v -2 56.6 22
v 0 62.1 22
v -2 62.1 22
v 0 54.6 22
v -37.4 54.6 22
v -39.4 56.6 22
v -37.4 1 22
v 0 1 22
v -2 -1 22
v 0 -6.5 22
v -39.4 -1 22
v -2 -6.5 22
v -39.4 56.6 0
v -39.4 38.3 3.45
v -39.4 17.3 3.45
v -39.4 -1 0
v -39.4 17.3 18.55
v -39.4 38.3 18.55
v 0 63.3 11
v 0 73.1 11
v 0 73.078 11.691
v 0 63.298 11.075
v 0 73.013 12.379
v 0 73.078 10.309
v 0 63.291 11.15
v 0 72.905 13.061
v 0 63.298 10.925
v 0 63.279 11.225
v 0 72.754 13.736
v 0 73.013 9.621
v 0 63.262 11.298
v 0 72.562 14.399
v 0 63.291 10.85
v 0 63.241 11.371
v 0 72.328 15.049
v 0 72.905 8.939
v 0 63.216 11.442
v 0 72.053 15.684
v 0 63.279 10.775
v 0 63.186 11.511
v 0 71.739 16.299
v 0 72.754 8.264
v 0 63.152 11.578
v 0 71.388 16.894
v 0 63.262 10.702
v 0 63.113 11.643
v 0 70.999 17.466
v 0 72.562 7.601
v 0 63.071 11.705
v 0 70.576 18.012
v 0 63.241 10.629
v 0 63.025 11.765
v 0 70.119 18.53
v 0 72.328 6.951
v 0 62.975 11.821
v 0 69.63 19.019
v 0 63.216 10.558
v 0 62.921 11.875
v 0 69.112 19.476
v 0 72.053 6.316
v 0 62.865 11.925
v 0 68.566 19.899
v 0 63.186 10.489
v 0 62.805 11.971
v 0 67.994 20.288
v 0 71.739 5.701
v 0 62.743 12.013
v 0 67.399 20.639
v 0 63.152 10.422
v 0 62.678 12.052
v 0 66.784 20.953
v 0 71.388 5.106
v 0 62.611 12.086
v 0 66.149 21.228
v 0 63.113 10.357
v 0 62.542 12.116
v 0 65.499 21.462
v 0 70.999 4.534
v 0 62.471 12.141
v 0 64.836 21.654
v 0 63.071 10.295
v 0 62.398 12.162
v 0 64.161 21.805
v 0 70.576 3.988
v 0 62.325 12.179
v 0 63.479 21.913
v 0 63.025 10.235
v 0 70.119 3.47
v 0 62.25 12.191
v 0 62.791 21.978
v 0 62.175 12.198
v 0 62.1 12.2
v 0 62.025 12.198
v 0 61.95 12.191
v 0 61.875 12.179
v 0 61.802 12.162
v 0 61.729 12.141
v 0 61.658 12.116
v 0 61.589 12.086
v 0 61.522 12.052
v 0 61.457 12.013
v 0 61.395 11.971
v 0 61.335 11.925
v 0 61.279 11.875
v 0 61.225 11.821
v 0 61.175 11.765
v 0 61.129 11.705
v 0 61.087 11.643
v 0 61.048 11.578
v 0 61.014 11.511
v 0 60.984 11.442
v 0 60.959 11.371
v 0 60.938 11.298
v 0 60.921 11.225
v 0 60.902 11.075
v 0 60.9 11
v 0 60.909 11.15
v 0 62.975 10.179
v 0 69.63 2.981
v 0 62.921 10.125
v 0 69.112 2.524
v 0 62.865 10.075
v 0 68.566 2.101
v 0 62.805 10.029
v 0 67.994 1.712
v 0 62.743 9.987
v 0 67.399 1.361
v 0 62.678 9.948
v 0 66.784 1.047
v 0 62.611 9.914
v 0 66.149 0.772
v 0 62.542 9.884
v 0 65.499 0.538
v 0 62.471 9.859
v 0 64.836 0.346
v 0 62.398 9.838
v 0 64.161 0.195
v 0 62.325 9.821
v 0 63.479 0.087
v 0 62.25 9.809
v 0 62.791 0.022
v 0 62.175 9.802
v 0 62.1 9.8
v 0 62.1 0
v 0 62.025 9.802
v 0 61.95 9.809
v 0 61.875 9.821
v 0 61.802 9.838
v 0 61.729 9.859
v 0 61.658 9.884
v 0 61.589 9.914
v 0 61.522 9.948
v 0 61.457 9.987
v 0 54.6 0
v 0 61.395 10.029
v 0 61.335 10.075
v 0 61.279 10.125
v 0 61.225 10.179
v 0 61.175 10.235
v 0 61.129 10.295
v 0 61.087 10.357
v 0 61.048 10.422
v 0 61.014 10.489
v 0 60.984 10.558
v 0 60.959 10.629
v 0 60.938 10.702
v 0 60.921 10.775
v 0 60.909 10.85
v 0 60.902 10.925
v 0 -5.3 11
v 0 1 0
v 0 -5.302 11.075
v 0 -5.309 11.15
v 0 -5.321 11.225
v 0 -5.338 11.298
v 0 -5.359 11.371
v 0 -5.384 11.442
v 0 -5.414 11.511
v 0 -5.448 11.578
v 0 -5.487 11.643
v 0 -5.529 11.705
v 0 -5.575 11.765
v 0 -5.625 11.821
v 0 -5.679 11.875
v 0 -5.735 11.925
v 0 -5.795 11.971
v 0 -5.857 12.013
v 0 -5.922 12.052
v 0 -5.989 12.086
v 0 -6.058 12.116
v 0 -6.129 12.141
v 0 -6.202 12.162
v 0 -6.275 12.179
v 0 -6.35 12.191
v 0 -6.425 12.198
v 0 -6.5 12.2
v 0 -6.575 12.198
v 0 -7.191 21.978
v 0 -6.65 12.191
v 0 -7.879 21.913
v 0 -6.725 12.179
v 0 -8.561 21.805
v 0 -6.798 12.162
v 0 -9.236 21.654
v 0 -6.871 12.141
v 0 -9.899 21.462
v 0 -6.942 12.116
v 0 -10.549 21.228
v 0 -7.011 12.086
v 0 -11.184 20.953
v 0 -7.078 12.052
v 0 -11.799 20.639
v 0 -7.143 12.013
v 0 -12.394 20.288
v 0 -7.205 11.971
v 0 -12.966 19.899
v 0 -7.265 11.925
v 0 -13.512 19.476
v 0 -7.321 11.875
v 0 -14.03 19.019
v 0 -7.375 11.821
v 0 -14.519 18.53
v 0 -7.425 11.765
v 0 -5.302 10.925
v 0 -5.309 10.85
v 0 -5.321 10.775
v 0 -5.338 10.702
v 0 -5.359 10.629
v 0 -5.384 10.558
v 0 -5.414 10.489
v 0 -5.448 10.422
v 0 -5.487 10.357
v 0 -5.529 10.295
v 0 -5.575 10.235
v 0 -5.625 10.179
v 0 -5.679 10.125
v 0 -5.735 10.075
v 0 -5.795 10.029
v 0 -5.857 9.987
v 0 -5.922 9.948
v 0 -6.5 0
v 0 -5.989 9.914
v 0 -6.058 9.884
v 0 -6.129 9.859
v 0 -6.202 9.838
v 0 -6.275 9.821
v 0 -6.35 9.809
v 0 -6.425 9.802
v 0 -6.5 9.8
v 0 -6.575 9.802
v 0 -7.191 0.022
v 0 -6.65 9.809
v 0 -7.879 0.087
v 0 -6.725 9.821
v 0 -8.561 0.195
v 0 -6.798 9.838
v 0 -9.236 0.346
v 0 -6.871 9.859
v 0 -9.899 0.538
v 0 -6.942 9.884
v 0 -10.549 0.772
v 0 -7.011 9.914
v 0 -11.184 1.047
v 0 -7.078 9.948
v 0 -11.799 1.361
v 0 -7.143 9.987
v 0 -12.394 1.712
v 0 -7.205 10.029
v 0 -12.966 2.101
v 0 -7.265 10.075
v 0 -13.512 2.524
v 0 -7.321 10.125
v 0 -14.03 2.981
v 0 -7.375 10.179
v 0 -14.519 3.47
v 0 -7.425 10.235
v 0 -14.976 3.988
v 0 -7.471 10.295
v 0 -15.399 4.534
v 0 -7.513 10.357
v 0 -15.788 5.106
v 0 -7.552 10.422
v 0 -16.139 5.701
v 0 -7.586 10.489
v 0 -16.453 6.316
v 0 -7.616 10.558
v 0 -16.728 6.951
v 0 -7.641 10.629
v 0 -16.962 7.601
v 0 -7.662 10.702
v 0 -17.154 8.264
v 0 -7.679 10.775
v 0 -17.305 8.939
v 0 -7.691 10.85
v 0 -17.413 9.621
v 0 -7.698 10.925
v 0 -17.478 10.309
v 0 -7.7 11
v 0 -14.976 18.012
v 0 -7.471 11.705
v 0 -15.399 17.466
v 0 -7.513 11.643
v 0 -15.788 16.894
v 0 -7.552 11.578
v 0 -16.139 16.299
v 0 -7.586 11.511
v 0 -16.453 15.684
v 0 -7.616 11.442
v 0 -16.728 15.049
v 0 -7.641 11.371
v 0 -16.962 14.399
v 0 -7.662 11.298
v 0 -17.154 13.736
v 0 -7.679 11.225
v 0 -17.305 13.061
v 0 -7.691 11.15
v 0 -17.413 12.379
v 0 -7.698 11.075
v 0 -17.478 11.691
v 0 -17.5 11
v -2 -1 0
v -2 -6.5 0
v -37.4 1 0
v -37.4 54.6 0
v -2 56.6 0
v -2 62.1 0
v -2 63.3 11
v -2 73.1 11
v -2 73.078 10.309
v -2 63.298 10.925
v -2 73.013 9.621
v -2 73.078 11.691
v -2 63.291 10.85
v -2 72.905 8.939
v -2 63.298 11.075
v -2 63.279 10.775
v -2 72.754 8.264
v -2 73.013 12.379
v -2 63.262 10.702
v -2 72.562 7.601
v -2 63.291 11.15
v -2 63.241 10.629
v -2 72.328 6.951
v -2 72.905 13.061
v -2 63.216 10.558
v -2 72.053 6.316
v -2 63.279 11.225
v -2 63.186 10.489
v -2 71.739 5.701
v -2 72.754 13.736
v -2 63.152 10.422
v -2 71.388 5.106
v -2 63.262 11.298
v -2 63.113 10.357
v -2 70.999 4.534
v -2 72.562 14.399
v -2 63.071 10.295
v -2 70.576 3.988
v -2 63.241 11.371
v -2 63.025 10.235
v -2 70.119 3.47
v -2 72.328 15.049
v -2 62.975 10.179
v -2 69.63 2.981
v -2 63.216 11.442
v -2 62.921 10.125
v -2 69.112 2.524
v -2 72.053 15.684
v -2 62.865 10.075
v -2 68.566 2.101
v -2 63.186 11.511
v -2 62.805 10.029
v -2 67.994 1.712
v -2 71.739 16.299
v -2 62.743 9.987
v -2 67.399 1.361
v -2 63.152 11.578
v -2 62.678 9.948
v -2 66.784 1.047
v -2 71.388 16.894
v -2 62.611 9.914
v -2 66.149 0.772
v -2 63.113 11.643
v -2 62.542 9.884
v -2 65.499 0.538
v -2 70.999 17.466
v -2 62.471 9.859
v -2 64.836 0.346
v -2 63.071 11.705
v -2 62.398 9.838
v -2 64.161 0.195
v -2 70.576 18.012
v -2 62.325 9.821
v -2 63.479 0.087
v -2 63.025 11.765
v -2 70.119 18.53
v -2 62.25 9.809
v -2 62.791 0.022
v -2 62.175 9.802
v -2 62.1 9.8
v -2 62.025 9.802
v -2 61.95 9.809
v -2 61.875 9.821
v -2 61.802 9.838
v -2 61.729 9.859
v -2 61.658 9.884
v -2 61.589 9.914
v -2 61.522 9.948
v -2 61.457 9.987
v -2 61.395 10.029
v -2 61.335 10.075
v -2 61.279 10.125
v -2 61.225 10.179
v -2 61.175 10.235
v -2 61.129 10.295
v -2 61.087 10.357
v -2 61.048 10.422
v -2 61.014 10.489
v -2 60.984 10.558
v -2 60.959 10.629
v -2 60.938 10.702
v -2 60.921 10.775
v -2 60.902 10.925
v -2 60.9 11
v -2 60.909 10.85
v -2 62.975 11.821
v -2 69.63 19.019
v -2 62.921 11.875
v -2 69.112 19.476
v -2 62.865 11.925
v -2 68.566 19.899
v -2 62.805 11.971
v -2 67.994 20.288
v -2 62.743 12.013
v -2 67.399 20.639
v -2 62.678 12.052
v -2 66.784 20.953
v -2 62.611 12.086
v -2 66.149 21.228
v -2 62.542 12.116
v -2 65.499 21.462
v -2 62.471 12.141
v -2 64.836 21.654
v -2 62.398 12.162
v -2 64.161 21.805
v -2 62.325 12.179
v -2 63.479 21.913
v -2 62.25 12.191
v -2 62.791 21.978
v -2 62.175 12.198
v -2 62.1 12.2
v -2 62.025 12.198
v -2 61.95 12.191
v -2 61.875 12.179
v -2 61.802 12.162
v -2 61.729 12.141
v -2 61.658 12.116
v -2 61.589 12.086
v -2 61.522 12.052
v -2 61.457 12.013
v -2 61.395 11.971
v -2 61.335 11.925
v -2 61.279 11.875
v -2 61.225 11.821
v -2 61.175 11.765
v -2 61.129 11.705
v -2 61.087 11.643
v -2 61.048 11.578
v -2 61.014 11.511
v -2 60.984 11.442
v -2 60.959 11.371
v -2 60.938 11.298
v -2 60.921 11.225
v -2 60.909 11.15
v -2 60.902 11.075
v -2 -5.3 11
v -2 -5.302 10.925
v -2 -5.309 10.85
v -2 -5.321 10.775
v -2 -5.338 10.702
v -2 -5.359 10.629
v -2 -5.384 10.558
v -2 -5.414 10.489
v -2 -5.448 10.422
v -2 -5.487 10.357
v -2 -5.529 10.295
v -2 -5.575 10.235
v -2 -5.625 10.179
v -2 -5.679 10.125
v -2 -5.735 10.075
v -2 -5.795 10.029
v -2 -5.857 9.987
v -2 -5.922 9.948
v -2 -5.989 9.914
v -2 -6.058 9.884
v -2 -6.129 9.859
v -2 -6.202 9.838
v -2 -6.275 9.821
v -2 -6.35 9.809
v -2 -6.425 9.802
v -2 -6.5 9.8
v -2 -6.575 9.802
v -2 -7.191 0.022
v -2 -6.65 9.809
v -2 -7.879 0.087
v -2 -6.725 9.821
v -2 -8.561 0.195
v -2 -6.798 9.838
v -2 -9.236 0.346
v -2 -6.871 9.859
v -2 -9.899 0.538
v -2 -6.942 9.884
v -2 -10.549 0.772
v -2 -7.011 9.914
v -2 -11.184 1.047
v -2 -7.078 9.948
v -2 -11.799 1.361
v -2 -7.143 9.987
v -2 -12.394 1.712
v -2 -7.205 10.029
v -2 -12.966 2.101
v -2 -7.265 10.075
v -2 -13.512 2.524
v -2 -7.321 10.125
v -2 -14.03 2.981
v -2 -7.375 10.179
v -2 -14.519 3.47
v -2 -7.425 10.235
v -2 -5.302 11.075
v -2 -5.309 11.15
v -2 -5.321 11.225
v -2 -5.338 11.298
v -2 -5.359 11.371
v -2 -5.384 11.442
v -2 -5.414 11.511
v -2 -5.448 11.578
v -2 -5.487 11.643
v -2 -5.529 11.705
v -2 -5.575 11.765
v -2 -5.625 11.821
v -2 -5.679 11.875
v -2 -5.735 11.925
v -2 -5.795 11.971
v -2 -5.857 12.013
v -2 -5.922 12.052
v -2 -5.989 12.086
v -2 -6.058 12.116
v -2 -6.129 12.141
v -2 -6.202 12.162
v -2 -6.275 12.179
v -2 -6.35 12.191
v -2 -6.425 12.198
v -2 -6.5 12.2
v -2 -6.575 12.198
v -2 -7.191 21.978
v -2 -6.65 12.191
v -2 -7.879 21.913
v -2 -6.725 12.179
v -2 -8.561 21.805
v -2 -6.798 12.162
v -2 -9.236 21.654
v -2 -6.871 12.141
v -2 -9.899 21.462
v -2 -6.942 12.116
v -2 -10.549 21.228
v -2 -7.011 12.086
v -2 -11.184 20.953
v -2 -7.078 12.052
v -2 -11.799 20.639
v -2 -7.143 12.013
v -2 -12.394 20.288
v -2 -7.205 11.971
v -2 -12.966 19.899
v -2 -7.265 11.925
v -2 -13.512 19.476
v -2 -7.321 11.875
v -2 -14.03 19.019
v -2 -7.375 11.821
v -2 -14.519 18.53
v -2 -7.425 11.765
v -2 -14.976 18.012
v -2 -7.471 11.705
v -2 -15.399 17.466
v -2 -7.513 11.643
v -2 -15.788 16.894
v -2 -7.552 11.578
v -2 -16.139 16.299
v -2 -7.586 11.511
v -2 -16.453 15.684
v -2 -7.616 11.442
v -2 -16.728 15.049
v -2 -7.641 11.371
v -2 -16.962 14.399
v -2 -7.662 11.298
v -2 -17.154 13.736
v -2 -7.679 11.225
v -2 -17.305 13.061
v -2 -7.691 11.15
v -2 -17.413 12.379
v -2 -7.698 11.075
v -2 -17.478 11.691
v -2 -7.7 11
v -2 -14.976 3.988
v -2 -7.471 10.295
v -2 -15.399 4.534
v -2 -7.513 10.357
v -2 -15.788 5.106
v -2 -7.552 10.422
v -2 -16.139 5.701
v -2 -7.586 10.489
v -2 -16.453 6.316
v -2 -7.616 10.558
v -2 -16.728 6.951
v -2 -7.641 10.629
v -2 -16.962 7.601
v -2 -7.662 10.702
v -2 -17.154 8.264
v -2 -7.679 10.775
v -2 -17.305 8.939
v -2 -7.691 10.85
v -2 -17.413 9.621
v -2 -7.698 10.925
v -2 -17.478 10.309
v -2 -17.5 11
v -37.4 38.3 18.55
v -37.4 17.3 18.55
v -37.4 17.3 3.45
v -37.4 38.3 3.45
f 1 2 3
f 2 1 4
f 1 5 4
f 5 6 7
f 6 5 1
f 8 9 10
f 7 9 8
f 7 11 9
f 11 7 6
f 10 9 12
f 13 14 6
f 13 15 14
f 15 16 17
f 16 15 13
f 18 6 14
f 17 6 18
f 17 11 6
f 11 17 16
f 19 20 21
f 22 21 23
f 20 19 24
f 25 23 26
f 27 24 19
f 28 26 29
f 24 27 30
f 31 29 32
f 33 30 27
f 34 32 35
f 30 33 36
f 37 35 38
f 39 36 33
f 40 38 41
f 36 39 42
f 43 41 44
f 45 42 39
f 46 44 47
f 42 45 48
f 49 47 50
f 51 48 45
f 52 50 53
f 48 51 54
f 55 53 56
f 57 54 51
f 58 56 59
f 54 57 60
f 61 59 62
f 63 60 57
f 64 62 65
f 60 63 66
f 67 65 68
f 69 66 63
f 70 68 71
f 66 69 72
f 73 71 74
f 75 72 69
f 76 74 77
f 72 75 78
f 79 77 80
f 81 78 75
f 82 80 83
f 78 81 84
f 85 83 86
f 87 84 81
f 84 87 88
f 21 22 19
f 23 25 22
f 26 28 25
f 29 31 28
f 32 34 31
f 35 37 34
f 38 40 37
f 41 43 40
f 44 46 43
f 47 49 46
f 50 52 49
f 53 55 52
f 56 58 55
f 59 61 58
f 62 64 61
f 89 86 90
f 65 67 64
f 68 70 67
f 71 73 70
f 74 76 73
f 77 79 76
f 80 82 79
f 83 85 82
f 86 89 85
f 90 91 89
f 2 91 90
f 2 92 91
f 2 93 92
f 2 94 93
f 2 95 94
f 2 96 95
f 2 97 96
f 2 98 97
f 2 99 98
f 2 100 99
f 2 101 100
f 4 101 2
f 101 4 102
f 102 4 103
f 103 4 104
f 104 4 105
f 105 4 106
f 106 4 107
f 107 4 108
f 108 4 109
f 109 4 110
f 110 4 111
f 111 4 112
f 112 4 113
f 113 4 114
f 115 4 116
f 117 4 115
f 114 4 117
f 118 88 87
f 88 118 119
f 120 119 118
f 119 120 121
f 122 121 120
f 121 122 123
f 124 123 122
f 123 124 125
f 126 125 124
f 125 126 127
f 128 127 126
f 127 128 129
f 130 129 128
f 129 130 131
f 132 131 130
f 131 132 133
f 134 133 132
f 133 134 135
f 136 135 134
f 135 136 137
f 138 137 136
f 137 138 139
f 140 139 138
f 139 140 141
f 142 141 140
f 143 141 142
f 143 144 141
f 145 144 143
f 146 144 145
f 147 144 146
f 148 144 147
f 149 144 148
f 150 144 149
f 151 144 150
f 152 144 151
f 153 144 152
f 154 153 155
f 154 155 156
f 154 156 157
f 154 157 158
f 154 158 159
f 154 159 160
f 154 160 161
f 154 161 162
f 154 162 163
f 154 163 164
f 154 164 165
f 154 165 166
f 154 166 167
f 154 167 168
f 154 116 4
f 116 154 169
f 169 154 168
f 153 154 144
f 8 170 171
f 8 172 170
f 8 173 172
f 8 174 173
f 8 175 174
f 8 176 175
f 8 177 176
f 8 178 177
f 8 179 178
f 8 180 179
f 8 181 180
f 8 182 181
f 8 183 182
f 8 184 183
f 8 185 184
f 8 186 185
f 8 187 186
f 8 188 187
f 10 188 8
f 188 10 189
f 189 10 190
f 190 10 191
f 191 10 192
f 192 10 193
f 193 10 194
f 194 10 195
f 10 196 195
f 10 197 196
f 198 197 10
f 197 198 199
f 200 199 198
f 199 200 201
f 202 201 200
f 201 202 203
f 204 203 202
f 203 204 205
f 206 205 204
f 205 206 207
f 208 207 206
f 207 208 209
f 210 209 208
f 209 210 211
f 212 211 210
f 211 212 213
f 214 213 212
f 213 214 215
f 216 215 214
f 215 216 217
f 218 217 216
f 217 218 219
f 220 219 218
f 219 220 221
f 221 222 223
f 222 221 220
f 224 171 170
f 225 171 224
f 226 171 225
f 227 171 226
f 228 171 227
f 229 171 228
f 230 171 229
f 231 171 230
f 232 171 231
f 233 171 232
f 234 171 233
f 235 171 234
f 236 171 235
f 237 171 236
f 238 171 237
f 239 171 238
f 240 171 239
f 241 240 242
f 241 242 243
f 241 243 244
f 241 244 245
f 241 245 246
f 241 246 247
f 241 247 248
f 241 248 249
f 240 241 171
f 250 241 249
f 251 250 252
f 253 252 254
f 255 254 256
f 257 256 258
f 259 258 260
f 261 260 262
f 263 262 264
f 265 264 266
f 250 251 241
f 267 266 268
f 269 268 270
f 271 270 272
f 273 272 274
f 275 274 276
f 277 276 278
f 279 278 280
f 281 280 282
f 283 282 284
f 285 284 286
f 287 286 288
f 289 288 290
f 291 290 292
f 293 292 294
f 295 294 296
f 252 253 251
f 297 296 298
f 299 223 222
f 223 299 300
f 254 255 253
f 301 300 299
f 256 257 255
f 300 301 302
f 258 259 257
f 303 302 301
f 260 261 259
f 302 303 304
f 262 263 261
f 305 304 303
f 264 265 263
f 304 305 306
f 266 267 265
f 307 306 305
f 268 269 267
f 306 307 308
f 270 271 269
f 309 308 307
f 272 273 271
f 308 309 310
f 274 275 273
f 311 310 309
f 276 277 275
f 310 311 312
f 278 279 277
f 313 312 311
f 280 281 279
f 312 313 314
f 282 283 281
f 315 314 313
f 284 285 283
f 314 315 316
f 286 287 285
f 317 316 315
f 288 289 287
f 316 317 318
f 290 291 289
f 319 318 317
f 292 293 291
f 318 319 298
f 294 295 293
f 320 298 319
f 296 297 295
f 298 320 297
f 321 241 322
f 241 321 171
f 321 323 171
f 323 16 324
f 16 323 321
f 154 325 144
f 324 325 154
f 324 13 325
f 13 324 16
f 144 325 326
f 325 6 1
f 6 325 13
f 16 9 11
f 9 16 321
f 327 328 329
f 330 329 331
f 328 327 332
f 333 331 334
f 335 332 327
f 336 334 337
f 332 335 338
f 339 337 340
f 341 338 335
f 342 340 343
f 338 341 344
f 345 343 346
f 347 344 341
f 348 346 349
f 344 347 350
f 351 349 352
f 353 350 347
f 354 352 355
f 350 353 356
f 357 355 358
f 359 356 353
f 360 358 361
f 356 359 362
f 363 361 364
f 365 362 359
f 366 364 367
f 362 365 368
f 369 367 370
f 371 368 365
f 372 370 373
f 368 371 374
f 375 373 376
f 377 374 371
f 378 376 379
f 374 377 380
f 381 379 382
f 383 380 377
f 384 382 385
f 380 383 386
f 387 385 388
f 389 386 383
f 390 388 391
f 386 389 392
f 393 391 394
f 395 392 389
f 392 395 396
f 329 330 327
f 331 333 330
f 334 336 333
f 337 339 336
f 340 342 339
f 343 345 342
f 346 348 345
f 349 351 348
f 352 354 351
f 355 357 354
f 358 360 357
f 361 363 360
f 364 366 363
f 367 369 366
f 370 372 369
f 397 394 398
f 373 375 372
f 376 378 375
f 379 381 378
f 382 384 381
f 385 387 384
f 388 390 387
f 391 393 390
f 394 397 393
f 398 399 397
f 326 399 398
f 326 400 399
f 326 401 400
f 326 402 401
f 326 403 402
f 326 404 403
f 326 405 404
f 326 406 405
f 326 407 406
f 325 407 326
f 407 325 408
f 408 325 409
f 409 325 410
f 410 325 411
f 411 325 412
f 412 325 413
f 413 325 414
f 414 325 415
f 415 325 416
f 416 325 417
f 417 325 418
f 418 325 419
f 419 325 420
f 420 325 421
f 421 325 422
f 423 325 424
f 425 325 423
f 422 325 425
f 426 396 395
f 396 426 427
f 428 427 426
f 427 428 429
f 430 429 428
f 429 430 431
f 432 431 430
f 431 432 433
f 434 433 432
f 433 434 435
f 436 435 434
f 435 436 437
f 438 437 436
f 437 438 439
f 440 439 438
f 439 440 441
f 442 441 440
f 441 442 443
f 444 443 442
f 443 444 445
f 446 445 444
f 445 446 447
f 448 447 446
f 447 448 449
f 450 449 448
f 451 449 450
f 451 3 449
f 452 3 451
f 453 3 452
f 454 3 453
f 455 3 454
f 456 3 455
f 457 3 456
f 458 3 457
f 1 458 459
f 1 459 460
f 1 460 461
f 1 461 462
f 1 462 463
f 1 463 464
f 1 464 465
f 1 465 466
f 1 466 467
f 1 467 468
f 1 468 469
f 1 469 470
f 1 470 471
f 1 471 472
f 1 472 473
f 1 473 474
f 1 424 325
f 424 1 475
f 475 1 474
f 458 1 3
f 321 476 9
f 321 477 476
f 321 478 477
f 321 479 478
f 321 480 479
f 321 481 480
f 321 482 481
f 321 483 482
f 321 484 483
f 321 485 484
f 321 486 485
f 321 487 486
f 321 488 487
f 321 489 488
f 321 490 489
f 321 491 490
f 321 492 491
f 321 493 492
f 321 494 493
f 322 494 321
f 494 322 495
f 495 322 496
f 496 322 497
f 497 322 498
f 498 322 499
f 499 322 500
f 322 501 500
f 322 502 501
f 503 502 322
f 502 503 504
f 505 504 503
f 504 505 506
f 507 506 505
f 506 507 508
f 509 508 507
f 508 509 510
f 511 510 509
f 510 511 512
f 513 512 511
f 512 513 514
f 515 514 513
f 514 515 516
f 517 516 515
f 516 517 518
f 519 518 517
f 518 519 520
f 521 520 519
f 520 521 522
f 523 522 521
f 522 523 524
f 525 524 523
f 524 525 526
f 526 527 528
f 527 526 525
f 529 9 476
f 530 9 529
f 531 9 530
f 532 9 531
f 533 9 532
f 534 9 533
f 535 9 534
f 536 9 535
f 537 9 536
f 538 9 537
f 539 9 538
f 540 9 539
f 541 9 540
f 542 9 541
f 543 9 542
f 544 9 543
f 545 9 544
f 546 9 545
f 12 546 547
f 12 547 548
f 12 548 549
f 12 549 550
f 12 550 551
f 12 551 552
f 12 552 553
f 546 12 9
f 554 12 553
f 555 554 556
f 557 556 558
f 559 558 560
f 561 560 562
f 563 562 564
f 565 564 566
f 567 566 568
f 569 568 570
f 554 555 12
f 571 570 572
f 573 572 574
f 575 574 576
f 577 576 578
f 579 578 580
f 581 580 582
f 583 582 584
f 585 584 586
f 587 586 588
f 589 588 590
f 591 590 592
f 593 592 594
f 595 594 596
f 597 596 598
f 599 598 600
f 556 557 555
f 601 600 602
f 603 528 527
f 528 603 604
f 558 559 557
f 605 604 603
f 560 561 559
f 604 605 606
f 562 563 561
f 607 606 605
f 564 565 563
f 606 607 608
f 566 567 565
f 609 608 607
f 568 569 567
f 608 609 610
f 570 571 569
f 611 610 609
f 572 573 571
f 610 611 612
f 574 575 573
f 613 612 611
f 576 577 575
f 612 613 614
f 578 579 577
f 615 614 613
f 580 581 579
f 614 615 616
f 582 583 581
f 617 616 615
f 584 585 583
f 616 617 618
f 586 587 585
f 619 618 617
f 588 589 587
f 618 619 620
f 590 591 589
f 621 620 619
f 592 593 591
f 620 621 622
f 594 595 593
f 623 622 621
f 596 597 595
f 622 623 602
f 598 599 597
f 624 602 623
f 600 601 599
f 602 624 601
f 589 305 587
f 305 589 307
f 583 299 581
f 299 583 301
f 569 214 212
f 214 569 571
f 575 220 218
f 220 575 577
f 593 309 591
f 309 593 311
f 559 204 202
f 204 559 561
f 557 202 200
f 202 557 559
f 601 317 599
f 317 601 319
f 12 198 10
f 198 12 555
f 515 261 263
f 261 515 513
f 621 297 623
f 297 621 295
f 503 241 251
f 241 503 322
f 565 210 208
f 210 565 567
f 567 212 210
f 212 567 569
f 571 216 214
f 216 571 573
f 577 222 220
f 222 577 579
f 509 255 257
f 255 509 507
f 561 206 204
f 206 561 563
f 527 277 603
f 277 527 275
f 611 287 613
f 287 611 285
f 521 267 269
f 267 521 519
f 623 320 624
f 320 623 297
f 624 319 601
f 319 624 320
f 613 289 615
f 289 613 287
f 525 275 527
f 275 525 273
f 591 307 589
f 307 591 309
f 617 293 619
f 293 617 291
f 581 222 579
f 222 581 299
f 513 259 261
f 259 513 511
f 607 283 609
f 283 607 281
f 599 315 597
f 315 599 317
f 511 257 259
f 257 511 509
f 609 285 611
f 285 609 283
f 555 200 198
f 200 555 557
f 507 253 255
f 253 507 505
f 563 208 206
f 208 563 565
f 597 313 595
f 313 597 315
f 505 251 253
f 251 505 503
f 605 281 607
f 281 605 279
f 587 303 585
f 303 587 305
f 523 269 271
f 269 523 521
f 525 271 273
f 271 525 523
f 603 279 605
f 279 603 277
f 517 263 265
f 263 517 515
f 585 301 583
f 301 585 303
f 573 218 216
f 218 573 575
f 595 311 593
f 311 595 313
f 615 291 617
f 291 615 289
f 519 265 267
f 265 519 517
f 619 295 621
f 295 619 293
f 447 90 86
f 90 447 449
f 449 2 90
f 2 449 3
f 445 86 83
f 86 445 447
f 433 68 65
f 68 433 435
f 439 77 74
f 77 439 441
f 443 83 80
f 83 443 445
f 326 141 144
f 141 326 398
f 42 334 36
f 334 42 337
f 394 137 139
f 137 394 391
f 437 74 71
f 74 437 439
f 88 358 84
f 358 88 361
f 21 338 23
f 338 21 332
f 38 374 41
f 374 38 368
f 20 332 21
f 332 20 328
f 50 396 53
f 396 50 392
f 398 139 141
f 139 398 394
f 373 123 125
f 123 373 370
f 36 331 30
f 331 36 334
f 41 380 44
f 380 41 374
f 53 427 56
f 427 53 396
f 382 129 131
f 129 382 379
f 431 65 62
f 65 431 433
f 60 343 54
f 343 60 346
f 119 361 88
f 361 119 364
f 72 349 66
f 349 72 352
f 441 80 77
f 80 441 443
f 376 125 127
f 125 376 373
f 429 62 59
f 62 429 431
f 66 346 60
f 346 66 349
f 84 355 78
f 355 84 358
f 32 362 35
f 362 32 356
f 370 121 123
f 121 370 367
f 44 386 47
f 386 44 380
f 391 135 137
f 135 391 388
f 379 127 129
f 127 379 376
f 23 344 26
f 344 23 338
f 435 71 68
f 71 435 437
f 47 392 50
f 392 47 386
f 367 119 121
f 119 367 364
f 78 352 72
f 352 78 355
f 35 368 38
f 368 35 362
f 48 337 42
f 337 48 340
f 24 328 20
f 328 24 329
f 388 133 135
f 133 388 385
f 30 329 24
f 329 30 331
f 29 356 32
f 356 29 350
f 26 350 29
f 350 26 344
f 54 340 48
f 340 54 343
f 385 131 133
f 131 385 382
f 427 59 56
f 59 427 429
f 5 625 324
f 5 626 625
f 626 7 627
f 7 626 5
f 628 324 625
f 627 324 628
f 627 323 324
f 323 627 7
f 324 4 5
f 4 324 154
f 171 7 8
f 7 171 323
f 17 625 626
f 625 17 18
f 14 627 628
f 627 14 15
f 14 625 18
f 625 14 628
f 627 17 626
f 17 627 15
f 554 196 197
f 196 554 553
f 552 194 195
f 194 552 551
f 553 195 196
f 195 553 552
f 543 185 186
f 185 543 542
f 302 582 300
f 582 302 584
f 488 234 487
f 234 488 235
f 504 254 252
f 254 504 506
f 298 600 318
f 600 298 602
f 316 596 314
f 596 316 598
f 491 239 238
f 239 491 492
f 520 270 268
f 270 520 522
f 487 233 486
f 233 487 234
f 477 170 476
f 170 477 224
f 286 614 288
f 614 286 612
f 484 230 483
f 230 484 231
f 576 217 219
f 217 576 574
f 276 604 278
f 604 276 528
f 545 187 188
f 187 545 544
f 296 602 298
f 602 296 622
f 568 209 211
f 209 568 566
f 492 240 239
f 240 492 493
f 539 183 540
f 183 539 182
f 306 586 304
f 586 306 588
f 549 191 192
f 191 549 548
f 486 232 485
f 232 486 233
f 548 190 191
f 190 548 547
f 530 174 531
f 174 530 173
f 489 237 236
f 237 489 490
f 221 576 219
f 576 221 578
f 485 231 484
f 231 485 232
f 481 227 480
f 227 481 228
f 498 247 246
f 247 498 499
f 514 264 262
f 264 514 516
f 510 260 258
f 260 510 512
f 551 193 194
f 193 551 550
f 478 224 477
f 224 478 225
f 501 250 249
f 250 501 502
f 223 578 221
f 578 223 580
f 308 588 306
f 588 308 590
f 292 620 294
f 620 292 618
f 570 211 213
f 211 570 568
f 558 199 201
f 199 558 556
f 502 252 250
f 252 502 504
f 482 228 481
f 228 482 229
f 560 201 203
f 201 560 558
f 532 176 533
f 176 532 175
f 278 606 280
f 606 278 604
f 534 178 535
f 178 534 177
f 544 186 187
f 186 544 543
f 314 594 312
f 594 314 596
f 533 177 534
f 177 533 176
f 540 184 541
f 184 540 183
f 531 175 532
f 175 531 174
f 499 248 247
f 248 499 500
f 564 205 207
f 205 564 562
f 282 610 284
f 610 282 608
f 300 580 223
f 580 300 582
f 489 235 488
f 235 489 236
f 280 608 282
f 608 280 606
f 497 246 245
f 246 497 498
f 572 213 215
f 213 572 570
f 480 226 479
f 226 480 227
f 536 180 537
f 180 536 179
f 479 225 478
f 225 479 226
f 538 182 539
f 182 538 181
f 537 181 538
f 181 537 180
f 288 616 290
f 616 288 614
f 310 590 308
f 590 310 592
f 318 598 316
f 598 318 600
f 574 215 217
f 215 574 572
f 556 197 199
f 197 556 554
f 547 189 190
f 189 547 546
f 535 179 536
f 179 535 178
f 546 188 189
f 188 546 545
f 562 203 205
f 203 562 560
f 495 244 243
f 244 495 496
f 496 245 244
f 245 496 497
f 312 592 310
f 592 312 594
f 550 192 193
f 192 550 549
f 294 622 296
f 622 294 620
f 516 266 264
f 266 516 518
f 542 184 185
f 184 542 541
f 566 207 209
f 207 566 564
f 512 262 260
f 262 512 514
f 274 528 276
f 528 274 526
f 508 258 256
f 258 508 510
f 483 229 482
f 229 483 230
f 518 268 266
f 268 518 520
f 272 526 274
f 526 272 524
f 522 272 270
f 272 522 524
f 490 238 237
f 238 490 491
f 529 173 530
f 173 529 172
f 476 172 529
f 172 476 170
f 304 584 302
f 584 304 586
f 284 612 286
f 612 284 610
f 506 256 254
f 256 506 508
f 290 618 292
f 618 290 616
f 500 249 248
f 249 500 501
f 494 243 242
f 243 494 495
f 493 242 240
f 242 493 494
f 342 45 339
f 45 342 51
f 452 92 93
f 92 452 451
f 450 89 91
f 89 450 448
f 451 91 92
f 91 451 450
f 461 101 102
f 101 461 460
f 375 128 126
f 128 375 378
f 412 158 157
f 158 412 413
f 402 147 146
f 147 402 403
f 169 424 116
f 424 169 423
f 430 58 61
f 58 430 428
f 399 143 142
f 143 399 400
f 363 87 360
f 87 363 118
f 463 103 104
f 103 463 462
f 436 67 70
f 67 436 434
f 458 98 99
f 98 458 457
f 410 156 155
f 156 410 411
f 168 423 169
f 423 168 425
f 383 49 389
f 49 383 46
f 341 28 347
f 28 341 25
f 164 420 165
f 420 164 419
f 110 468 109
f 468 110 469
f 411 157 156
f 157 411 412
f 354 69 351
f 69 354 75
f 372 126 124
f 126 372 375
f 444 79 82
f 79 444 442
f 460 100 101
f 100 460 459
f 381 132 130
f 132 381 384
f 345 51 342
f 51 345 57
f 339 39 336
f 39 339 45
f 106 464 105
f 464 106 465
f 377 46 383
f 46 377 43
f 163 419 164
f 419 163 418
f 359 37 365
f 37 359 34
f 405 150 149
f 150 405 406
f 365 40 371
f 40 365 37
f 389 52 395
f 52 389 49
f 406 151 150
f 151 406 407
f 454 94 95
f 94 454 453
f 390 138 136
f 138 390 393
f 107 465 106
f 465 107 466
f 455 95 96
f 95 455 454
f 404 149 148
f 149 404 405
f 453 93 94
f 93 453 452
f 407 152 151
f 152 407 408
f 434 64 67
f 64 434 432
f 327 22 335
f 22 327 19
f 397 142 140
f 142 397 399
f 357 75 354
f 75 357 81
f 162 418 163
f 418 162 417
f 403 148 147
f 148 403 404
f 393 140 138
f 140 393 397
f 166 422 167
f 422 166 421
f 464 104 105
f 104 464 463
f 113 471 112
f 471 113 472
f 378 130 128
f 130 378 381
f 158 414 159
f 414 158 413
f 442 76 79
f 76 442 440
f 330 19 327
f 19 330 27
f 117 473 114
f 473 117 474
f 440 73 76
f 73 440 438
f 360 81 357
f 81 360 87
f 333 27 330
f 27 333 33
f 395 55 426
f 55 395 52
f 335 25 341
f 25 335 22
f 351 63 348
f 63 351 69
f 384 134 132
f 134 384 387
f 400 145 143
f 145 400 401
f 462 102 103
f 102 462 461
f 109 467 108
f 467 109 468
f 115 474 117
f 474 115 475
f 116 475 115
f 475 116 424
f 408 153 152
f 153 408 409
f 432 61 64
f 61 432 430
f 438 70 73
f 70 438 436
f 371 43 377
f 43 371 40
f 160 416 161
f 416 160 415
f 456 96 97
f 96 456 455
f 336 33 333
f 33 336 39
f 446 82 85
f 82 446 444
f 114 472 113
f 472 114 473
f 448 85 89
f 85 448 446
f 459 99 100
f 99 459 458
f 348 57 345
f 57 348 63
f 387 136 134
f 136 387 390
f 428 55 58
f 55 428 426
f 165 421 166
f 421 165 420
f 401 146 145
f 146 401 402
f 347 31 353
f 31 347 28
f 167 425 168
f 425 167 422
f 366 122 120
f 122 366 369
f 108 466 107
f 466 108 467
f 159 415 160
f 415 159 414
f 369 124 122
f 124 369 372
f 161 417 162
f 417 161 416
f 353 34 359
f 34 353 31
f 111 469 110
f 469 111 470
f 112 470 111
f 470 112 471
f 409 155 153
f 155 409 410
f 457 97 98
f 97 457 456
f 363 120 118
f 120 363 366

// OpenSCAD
// [FL_INDEX: keywords="openscad, 3d_parametric, PRotos_Heatbed_Powersupply_Holder_Strap, csg_solid" | COT="Parametric OpenSCAD design from 3DCodeverse"]
// Title: PRotos Heatbed Powersupply Holder/Strap

// Created by Simon Brüchner - public domain


// Inner dimensions
LENGTH        = 53.6;
WIDTH         = 22;
HEIGHT        = 37.4;


// Botton hole at the top
BUTTON_LENGTH = 21.0;
BUTTON_WIDTH  = 15.1;

// Screw diameter
SCREWHOLE     = 2;

WALL          = 2;
SPAN          = WIDTH / 4;



rotate([0,-90,0]) {
	difference() {
		union() {
	      color("yellow") translate([0,-WALL/2,0])  cube([WIDTH, LENGTH+(2*WALL), HEIGHT+WALL]);
			color("pink") translate([0,-SPAN-WALL/2,0]) cube([WIDTH, LENGTH+(2*(WALL+SPAN)), WALL]);
			color("green") translate([WIDTH/2,-WALL/2-SPAN,0]) cylinder(r=WIDTH/2, h=WALL);
			color("gray") translate([WIDTH/2,LENGTH+SPAN+WALL+WALL/2,0]) cylinder(r=WIDTH/2, h=WALL);
		}
		union() {
			color("red")  translate([-1,WALL/2,-1]) cube([WIDTH+2, LENGTH, HEIGHT+1]);
			color("blue") translate([(WIDTH / 2) - (BUTTON_WIDTH / 2), (LENGTH / 2) - (BUTTON_LENGTH / 2)+WALL/2, HEIGHT -1]) cube([BUTTON_WIDTH, BUTTON_LENGTH, WALL+2]);
	
			translate([WIDTH/2,-WALL/2-SPAN,-1]) cylinder(r=SCREWHOLE/2+0.2, h=WALL+2);	translate([WIDTH/2,LENGTH+SPAN+(1*WALL)+WALL/2,-1]) cylinder(r=SCREWHOLE/2+0.2, h=WALL+2);
		}
	}
}

$fn=100; 
